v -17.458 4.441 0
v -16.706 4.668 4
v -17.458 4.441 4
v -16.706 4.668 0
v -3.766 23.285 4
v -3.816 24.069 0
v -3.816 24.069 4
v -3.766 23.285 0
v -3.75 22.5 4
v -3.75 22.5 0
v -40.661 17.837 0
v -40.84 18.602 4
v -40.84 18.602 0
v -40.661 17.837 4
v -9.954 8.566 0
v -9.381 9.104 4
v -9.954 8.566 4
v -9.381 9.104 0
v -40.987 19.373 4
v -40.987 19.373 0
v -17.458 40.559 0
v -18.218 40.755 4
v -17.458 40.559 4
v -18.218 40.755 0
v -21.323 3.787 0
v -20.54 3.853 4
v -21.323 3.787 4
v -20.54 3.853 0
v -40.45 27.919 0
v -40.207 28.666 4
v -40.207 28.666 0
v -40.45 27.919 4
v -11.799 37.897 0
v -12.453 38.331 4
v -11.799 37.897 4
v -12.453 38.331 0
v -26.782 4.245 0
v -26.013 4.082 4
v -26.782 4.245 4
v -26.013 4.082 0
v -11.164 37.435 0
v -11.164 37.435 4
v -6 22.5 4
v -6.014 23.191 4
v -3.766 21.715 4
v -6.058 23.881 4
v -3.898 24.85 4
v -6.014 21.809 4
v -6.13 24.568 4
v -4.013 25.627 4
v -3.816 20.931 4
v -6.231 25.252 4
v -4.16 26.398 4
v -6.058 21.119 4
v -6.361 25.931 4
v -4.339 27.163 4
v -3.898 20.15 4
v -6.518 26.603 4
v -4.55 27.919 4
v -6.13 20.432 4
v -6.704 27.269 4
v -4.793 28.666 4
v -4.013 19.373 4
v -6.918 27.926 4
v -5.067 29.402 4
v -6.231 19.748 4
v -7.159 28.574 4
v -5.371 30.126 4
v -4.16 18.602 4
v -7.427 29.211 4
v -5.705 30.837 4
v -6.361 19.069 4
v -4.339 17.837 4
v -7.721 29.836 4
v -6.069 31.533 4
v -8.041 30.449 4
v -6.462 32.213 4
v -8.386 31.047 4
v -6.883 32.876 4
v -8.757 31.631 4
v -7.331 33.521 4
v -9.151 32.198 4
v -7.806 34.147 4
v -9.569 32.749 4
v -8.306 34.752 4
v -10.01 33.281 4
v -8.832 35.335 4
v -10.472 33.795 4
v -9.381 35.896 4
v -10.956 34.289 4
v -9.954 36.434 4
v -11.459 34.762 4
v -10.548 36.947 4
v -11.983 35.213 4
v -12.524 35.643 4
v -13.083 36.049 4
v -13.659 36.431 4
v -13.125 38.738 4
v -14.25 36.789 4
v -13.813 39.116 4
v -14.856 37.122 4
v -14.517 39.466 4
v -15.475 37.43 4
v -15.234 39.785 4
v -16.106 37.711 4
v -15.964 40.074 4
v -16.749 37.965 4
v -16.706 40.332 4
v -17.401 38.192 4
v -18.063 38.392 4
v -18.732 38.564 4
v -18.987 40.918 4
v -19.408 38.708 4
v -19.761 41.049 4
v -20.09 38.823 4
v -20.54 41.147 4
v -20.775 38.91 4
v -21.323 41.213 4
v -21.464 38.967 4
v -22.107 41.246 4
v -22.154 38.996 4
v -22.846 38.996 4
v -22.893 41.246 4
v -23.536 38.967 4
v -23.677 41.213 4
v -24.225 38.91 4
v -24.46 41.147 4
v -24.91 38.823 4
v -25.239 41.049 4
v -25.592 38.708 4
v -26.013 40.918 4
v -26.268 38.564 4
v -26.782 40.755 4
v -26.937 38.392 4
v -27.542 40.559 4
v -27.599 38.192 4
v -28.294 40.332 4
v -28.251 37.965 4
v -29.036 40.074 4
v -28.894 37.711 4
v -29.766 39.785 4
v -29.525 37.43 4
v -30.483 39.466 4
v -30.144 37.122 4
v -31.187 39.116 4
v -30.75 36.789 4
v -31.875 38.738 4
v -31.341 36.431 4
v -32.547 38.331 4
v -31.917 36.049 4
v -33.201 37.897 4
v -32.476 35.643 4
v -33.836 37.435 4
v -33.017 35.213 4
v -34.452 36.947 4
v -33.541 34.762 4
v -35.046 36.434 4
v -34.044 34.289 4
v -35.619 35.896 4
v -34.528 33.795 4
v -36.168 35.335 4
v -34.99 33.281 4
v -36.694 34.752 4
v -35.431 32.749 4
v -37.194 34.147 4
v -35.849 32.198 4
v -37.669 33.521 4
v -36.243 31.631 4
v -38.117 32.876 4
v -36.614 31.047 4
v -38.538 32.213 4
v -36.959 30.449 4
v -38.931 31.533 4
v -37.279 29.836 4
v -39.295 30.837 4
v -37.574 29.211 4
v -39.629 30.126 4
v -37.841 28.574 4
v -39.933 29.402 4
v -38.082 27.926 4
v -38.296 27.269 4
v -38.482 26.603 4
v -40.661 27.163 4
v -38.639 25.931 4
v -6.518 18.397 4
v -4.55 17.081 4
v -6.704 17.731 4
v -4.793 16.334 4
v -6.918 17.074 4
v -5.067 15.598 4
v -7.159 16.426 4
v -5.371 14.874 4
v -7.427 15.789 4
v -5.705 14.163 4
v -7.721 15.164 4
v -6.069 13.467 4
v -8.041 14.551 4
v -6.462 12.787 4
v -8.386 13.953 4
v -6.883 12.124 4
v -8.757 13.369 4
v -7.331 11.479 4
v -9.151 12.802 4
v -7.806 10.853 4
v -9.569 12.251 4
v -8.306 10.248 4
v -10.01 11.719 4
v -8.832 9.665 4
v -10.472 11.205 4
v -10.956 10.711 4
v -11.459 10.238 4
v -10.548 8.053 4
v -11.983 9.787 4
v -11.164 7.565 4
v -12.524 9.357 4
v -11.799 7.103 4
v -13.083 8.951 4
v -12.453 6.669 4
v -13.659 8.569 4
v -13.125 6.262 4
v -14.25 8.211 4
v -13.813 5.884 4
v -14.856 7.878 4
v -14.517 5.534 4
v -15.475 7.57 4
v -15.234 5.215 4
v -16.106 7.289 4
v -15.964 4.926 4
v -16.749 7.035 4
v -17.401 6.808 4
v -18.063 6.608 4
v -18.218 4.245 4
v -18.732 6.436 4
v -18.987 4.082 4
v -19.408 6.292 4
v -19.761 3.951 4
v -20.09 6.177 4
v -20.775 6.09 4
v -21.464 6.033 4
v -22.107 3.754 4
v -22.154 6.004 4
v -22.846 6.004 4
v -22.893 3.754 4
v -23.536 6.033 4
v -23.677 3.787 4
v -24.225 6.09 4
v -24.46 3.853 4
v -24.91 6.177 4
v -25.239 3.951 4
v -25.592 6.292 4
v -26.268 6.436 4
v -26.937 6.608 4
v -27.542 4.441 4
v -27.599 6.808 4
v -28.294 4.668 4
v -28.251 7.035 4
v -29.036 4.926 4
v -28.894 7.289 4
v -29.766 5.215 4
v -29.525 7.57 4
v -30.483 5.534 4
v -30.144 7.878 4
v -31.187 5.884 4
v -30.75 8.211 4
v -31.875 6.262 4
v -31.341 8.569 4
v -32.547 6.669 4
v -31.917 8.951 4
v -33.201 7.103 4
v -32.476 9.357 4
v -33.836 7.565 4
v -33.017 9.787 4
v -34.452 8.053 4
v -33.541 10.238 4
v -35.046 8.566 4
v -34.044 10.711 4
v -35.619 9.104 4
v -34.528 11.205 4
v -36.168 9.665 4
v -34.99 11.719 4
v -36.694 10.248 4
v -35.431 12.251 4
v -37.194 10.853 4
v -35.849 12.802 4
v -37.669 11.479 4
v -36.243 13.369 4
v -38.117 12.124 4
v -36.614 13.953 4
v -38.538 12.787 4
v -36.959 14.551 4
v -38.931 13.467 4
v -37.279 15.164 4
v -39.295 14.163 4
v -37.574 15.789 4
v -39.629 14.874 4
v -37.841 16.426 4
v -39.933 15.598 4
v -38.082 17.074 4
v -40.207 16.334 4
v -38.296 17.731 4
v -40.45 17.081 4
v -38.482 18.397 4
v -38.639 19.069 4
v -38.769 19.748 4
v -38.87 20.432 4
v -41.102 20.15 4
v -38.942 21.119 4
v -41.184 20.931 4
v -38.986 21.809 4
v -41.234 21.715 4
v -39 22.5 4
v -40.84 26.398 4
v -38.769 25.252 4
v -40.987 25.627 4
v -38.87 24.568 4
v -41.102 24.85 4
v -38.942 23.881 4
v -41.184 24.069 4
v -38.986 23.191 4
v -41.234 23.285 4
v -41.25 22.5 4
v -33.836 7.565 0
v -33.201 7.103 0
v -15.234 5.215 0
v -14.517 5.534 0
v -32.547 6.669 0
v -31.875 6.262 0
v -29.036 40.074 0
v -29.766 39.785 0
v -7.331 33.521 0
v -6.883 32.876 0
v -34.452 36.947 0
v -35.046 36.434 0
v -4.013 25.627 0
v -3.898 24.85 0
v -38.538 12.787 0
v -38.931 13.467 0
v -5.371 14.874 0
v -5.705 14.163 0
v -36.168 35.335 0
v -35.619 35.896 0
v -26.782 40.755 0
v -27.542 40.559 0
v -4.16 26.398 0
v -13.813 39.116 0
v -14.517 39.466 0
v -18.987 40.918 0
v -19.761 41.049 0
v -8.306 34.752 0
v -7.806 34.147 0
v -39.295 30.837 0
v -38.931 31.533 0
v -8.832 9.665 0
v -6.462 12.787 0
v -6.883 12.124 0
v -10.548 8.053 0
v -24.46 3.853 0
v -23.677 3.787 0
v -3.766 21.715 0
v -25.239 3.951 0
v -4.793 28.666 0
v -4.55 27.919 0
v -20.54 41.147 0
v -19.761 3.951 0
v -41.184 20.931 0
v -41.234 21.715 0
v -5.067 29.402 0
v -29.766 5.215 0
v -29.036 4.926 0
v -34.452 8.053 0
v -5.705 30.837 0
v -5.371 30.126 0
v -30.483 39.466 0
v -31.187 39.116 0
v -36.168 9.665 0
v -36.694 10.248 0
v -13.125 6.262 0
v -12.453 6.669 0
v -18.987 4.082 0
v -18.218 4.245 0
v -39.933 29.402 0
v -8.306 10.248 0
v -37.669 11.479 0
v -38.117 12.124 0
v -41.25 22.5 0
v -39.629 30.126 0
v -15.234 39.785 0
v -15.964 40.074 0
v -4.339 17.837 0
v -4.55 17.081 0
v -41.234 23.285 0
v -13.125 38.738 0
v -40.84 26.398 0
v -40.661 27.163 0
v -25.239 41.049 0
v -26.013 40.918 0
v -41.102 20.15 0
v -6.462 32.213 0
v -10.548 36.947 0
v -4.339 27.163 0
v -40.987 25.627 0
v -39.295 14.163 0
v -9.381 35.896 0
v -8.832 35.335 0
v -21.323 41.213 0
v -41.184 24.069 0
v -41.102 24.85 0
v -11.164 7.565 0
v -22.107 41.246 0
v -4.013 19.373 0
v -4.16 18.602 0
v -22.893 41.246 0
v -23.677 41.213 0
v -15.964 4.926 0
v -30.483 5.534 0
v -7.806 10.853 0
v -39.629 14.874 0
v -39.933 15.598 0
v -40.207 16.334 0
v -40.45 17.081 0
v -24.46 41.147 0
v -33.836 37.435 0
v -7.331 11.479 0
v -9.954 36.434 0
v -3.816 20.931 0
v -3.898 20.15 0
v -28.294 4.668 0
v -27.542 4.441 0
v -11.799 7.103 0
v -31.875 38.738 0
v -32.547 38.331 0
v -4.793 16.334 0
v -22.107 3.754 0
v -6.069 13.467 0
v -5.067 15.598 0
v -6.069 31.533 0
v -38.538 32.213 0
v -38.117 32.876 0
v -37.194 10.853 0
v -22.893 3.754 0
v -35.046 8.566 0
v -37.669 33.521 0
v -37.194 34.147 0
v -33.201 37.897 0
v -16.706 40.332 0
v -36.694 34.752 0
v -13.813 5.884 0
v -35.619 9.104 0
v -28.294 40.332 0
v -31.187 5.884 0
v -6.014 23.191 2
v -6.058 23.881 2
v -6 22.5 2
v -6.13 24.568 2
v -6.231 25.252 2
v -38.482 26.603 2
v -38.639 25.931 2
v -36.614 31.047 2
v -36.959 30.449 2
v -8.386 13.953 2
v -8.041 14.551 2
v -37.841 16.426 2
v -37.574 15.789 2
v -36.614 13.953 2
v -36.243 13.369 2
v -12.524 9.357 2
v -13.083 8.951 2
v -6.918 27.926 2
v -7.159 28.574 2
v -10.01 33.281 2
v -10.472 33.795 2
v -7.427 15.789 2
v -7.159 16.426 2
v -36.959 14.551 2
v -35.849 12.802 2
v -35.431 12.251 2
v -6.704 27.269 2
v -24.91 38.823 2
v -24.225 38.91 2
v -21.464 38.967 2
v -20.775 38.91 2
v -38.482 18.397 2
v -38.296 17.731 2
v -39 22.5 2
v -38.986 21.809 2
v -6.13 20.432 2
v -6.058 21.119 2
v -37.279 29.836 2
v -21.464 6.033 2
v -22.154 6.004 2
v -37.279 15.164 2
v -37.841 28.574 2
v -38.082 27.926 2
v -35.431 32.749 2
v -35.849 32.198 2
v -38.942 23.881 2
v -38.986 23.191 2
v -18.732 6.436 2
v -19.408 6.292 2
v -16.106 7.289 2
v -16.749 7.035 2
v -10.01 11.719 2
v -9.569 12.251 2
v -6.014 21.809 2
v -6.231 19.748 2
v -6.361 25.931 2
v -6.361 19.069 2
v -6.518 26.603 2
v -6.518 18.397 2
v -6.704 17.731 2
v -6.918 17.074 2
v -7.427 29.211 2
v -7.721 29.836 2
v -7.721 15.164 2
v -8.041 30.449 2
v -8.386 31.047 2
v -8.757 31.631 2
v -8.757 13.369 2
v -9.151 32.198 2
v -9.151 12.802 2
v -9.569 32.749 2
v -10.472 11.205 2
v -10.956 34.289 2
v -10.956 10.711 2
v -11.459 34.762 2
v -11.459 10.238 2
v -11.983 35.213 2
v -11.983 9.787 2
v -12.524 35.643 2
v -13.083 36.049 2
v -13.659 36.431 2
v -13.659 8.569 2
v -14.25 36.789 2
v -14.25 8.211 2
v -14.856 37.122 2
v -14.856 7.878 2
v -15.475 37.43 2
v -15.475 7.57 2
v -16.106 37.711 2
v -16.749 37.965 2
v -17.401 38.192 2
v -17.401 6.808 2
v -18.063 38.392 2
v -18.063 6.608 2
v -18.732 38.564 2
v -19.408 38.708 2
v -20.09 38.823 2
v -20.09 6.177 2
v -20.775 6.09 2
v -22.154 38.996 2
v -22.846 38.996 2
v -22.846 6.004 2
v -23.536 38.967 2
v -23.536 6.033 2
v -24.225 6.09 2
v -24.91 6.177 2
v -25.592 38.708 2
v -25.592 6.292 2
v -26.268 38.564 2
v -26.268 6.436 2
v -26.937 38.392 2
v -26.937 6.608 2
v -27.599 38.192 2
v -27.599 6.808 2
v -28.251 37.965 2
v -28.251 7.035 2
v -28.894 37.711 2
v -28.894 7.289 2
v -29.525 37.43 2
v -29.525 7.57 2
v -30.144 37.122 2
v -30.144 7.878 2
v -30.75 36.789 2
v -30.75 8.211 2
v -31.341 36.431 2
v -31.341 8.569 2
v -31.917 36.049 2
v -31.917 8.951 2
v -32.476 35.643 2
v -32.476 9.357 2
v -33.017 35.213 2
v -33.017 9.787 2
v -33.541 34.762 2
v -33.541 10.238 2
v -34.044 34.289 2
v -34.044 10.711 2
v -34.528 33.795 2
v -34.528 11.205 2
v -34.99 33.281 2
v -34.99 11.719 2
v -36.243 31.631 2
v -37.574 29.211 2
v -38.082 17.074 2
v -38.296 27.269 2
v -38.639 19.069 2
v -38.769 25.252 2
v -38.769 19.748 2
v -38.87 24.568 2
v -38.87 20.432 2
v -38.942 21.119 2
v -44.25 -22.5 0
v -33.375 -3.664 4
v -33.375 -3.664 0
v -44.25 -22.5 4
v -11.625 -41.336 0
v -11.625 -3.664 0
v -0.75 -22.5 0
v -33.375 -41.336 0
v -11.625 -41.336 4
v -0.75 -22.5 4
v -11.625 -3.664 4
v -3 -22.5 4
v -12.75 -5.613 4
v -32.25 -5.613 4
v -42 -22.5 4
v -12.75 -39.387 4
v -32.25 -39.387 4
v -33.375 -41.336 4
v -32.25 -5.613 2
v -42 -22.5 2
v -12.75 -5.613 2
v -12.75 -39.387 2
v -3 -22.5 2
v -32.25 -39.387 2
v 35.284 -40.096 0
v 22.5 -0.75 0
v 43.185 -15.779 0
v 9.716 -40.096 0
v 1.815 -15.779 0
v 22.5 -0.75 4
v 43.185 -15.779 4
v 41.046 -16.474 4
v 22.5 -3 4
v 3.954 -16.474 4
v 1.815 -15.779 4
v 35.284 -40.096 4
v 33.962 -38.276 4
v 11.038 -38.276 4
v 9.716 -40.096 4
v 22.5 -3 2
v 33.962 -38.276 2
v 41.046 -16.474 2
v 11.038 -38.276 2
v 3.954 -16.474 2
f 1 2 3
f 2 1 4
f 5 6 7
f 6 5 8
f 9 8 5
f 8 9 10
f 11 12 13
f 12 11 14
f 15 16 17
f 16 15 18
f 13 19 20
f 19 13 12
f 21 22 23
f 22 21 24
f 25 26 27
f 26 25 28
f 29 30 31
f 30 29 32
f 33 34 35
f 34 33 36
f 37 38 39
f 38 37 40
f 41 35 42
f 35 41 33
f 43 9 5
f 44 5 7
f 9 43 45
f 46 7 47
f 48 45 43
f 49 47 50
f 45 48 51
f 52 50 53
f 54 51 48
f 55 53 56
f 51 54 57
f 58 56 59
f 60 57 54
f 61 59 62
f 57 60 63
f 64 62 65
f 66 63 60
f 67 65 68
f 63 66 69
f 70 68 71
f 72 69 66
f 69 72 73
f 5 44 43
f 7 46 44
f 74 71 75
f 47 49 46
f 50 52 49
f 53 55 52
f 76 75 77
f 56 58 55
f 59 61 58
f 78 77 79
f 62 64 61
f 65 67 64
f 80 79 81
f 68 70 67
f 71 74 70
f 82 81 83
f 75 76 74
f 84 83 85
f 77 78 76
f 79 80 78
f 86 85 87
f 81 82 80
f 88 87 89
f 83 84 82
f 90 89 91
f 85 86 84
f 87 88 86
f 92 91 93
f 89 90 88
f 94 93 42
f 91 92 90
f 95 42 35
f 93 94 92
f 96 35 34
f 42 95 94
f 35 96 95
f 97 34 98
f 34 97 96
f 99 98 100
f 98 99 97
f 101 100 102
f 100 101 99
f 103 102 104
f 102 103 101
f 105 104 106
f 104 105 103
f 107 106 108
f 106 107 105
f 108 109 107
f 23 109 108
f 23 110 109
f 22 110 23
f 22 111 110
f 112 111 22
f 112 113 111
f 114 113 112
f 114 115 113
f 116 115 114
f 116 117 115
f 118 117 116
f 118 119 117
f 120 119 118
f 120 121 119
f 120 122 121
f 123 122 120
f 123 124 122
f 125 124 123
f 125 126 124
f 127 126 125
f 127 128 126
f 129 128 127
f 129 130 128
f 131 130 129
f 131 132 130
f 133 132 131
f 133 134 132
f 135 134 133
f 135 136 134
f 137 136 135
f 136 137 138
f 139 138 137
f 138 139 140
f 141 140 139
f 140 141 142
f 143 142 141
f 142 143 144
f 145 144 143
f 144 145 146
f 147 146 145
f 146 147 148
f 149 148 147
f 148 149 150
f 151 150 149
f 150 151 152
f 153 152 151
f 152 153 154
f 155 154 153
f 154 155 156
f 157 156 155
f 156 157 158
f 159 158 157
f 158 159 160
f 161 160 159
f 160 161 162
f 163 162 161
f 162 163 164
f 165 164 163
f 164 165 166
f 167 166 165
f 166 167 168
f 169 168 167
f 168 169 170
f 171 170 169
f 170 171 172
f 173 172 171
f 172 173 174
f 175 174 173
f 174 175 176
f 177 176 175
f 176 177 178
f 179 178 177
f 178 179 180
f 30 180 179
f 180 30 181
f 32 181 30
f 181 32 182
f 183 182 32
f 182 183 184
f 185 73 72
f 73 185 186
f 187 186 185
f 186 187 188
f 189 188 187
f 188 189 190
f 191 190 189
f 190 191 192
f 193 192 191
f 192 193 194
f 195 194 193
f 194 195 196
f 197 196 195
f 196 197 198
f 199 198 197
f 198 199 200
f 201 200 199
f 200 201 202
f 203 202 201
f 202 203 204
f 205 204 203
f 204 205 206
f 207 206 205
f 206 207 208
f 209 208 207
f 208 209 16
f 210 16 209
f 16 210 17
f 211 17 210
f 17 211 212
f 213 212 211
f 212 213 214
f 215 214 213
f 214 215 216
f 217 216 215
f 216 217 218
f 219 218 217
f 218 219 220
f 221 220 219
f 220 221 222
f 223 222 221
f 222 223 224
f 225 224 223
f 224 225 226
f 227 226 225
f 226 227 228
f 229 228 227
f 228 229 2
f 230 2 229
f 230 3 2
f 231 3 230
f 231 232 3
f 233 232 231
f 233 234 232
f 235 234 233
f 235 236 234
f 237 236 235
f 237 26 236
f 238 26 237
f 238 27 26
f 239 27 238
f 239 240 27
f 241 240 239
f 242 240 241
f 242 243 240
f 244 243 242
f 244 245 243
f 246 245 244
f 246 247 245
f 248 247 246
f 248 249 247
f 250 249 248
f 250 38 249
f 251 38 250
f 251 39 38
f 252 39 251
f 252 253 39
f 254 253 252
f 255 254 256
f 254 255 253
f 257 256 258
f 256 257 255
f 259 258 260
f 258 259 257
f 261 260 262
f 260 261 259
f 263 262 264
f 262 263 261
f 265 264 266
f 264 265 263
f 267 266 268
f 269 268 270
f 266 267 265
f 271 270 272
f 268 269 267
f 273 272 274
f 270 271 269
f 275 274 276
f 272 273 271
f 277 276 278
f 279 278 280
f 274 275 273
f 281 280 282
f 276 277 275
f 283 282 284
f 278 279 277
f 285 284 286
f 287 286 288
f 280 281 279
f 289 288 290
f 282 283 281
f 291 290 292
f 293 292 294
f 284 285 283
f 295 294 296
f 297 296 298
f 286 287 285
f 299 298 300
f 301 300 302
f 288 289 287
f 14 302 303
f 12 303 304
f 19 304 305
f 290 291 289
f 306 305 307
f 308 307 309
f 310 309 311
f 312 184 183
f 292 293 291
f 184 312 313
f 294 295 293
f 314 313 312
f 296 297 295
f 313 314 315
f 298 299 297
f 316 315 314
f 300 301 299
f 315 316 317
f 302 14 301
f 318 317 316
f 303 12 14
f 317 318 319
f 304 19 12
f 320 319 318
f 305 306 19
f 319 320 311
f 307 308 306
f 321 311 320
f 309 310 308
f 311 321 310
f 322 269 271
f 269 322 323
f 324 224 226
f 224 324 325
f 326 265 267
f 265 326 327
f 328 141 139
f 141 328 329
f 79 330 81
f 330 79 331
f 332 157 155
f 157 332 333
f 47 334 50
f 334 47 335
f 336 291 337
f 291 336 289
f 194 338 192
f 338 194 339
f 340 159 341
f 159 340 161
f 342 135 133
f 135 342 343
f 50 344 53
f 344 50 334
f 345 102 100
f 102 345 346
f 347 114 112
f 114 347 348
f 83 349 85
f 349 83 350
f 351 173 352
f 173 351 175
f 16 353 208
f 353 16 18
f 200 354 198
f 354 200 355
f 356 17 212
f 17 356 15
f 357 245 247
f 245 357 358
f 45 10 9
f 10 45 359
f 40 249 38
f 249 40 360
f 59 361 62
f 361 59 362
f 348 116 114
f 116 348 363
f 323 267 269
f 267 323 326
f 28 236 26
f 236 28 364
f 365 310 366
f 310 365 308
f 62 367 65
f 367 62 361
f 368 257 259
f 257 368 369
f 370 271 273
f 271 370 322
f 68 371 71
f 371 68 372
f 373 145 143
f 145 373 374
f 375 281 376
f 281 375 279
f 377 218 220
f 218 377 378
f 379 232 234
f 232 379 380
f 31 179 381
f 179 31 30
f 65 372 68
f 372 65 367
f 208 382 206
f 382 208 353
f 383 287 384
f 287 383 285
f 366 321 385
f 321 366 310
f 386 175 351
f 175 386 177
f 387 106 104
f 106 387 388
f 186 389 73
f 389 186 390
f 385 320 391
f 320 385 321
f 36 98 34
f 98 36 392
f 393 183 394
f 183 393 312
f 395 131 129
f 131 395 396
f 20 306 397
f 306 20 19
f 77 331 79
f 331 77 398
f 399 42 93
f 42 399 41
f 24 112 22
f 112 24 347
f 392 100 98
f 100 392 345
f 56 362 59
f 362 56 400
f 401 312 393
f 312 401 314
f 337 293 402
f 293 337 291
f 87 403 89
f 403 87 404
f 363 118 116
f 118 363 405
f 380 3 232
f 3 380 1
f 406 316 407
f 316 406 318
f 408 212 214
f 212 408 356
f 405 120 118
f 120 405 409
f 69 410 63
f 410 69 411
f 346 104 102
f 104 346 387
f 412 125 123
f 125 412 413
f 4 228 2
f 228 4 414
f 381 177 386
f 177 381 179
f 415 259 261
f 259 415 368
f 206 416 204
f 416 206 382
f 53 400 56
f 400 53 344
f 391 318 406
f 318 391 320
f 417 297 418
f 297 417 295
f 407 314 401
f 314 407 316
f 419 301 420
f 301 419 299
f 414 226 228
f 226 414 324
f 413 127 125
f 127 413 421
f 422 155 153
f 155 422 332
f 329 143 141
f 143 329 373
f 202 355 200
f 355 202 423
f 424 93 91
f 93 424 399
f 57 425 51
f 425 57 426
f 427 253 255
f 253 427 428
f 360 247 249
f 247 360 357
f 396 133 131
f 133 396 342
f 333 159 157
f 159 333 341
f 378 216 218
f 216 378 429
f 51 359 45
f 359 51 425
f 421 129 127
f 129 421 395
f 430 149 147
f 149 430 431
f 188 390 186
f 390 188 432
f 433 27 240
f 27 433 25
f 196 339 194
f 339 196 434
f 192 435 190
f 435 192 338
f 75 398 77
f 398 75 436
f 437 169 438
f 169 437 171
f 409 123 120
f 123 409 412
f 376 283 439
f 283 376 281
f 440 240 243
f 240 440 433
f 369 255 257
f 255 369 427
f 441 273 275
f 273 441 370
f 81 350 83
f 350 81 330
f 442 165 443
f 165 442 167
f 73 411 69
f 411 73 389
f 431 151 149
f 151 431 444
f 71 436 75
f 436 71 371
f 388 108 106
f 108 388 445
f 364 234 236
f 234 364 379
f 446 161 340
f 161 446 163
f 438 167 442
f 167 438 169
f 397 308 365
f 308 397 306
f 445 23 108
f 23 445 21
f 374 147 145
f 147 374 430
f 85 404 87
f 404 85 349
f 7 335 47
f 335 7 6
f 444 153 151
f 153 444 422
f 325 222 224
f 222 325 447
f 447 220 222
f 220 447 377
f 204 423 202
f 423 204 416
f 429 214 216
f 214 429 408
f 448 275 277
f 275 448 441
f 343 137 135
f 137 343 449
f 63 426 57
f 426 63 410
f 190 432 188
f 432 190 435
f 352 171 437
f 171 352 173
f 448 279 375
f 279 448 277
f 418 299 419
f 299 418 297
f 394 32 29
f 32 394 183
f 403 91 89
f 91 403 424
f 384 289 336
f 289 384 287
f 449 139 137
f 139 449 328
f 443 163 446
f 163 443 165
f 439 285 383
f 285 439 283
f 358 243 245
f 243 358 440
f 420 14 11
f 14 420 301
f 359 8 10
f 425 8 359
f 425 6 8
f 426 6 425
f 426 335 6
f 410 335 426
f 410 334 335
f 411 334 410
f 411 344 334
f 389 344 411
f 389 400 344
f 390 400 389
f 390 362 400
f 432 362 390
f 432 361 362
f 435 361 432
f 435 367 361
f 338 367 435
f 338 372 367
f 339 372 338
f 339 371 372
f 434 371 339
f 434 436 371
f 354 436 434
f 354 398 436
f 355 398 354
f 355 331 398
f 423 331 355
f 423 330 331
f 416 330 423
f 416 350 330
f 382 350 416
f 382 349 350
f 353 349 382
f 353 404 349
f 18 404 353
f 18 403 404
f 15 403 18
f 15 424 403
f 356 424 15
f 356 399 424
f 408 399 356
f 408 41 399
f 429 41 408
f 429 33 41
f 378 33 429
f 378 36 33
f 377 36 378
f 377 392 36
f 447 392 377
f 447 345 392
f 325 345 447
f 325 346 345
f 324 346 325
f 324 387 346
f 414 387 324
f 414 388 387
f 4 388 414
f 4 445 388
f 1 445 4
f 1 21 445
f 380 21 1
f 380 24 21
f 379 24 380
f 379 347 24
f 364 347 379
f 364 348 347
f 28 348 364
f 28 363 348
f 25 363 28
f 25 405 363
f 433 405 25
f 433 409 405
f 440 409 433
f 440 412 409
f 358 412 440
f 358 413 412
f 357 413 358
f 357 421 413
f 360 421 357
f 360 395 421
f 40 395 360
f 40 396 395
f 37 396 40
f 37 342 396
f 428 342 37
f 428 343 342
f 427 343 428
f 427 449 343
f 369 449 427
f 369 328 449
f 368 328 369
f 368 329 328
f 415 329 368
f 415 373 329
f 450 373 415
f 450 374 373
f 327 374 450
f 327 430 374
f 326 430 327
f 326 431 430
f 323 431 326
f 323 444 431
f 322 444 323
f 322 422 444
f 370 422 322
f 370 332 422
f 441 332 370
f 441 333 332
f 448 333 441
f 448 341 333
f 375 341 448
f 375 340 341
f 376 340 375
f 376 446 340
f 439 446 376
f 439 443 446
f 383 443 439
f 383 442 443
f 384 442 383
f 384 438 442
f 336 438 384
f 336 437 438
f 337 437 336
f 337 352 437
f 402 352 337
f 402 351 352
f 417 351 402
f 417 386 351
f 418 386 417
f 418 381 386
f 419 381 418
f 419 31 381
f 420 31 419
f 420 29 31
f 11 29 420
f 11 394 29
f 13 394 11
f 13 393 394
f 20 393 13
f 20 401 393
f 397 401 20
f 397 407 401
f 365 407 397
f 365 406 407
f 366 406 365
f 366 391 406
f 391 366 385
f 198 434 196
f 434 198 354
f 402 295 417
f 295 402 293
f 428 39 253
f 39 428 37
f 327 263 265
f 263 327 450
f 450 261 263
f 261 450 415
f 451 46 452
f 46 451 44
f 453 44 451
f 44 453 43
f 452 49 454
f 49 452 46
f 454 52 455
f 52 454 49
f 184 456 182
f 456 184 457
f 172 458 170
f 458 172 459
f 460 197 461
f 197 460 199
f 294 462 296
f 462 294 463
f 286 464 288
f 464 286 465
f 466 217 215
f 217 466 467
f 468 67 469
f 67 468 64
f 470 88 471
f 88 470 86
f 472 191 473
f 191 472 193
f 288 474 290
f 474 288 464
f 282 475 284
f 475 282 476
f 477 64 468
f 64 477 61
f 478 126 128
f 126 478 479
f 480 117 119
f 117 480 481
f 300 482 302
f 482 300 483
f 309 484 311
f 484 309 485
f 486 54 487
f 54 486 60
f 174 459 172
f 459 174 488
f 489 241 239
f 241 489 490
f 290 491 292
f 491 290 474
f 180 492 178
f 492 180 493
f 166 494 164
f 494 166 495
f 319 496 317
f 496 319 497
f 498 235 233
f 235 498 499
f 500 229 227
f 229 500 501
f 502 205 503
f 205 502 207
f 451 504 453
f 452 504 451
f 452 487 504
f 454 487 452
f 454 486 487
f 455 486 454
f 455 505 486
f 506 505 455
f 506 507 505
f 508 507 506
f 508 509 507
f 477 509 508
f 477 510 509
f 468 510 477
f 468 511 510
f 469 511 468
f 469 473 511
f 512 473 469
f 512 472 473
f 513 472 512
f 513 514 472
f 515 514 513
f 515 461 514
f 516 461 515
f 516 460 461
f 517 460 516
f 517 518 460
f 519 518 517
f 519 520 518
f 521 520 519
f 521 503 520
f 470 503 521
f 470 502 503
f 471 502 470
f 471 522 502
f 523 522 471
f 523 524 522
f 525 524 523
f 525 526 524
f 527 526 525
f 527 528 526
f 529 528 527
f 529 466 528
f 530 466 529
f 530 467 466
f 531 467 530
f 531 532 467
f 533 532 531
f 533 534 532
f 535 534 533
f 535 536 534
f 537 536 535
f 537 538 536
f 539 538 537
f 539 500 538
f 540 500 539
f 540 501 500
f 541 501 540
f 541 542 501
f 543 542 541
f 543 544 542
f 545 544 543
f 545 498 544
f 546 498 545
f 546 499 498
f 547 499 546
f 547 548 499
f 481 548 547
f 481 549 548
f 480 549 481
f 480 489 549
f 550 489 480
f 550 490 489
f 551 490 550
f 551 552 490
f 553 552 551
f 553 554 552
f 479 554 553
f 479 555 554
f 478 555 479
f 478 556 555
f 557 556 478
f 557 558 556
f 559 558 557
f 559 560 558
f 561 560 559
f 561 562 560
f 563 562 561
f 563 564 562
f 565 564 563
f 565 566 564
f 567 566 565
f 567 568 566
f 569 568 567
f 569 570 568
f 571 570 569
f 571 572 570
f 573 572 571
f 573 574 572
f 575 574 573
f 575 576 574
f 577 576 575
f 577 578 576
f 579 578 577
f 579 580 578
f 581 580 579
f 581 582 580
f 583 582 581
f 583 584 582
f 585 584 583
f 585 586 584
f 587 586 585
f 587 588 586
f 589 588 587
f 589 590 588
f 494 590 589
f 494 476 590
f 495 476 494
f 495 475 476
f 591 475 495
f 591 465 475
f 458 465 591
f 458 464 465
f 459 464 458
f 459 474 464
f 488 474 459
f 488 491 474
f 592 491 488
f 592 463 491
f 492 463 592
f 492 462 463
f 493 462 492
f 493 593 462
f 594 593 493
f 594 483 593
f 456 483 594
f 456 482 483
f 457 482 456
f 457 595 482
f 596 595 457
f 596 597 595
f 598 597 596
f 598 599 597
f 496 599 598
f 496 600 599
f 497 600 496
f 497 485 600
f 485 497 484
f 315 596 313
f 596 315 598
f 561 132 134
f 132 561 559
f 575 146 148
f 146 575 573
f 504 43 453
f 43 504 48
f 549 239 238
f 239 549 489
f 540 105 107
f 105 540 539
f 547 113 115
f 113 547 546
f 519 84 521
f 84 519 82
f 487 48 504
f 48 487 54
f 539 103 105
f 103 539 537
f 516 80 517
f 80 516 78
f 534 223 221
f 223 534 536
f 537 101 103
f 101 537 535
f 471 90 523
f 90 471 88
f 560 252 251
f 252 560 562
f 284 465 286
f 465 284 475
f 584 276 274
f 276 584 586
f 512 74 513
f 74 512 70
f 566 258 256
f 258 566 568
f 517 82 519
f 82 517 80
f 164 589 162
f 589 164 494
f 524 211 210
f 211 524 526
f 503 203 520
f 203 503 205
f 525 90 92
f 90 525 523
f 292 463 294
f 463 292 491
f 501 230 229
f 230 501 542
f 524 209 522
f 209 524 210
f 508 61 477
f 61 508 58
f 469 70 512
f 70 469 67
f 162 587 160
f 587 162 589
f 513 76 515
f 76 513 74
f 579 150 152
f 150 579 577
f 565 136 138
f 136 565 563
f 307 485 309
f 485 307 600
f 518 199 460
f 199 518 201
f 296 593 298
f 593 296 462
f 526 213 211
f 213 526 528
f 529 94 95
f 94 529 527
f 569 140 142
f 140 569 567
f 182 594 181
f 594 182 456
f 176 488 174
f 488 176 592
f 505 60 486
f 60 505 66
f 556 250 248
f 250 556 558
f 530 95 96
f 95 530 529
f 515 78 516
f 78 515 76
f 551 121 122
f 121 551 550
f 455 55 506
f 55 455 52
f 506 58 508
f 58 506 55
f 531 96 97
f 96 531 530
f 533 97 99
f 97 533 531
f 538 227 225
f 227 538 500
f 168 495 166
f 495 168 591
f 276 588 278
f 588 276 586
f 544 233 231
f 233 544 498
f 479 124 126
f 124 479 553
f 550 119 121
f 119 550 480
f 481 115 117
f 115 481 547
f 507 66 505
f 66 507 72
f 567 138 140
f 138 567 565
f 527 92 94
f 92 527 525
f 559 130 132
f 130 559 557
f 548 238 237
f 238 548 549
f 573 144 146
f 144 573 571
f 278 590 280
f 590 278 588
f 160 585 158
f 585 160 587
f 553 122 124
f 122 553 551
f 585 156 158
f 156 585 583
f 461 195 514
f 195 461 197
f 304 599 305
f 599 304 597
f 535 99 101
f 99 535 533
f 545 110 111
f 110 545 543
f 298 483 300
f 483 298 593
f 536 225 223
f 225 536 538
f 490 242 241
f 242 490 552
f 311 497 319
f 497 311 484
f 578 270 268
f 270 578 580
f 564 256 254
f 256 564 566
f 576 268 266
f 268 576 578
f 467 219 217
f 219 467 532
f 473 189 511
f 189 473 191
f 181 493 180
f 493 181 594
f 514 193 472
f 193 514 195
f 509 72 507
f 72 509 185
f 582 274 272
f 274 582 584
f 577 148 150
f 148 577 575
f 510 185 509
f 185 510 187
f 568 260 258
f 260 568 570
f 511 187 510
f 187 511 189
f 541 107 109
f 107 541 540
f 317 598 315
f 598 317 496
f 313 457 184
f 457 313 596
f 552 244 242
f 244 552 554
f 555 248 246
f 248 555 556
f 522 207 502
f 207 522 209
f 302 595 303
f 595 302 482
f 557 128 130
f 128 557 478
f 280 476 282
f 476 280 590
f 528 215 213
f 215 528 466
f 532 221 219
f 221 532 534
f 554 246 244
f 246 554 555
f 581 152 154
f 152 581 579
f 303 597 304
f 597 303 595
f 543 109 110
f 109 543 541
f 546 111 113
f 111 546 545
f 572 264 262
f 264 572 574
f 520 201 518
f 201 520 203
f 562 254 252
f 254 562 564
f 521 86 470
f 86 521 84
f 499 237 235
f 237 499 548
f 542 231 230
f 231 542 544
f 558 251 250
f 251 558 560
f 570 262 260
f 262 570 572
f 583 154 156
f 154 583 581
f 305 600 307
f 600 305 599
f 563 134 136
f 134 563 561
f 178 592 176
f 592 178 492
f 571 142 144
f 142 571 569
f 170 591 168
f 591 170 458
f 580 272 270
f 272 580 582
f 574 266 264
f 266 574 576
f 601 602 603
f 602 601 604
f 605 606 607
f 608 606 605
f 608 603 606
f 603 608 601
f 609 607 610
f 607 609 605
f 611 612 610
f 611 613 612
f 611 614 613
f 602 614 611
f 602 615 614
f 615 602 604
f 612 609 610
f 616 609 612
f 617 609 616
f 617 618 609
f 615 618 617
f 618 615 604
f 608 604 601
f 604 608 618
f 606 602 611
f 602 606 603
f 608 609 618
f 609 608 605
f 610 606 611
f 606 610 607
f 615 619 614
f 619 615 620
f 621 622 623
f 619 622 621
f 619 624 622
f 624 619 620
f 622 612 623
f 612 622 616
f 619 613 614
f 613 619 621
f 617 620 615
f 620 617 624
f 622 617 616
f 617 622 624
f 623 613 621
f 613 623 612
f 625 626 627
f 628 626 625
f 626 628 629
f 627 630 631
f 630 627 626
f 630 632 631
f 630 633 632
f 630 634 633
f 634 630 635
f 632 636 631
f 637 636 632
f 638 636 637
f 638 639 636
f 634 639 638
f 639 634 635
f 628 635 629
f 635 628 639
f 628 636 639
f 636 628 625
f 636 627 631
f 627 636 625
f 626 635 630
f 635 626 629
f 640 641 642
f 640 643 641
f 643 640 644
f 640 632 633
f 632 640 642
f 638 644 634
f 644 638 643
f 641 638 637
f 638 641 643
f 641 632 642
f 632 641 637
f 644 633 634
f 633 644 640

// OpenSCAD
$fn=150;

module logo() {
translate([-20,-16,3]) 
  linear_extrude(height=2, center=true) 
    scale([.5,.5,0]) 
      import("DU2017_working.dxf");
}

module coinOne() {
  difference() {
    cylinder(h=4,r=25);
    translate([0,0,2]) cylinder(h=4,r=22);
  }
  
  logo();
}

module coinTwo() {
  difference() {
    linear_extrude(height=4) circle(r=29,$fn=6);
    translate([0,0,2]) linear_extrude(height=5) circle(r=26,$fn=6);
  }
  logo();
}

module coinThree() {
  rotate(a=[0,0,90]) {
    difference() {
      linear_extrude(height=4) circle(r=29,$fn=5);
      translate([0,0,2]) linear_extrude(height=5) circle(r=26,$fn=5);
    }
  }
  translate([1,1,0]) logo();
}



scale([.75,.75,1]) translate([-30,30,0]) coinOne();
scale([.75,.75,1]) translate([-30,-30,0]) coinTwo();
scale([.75,.75,1]) translate([30,-30,0]) coinThree();
